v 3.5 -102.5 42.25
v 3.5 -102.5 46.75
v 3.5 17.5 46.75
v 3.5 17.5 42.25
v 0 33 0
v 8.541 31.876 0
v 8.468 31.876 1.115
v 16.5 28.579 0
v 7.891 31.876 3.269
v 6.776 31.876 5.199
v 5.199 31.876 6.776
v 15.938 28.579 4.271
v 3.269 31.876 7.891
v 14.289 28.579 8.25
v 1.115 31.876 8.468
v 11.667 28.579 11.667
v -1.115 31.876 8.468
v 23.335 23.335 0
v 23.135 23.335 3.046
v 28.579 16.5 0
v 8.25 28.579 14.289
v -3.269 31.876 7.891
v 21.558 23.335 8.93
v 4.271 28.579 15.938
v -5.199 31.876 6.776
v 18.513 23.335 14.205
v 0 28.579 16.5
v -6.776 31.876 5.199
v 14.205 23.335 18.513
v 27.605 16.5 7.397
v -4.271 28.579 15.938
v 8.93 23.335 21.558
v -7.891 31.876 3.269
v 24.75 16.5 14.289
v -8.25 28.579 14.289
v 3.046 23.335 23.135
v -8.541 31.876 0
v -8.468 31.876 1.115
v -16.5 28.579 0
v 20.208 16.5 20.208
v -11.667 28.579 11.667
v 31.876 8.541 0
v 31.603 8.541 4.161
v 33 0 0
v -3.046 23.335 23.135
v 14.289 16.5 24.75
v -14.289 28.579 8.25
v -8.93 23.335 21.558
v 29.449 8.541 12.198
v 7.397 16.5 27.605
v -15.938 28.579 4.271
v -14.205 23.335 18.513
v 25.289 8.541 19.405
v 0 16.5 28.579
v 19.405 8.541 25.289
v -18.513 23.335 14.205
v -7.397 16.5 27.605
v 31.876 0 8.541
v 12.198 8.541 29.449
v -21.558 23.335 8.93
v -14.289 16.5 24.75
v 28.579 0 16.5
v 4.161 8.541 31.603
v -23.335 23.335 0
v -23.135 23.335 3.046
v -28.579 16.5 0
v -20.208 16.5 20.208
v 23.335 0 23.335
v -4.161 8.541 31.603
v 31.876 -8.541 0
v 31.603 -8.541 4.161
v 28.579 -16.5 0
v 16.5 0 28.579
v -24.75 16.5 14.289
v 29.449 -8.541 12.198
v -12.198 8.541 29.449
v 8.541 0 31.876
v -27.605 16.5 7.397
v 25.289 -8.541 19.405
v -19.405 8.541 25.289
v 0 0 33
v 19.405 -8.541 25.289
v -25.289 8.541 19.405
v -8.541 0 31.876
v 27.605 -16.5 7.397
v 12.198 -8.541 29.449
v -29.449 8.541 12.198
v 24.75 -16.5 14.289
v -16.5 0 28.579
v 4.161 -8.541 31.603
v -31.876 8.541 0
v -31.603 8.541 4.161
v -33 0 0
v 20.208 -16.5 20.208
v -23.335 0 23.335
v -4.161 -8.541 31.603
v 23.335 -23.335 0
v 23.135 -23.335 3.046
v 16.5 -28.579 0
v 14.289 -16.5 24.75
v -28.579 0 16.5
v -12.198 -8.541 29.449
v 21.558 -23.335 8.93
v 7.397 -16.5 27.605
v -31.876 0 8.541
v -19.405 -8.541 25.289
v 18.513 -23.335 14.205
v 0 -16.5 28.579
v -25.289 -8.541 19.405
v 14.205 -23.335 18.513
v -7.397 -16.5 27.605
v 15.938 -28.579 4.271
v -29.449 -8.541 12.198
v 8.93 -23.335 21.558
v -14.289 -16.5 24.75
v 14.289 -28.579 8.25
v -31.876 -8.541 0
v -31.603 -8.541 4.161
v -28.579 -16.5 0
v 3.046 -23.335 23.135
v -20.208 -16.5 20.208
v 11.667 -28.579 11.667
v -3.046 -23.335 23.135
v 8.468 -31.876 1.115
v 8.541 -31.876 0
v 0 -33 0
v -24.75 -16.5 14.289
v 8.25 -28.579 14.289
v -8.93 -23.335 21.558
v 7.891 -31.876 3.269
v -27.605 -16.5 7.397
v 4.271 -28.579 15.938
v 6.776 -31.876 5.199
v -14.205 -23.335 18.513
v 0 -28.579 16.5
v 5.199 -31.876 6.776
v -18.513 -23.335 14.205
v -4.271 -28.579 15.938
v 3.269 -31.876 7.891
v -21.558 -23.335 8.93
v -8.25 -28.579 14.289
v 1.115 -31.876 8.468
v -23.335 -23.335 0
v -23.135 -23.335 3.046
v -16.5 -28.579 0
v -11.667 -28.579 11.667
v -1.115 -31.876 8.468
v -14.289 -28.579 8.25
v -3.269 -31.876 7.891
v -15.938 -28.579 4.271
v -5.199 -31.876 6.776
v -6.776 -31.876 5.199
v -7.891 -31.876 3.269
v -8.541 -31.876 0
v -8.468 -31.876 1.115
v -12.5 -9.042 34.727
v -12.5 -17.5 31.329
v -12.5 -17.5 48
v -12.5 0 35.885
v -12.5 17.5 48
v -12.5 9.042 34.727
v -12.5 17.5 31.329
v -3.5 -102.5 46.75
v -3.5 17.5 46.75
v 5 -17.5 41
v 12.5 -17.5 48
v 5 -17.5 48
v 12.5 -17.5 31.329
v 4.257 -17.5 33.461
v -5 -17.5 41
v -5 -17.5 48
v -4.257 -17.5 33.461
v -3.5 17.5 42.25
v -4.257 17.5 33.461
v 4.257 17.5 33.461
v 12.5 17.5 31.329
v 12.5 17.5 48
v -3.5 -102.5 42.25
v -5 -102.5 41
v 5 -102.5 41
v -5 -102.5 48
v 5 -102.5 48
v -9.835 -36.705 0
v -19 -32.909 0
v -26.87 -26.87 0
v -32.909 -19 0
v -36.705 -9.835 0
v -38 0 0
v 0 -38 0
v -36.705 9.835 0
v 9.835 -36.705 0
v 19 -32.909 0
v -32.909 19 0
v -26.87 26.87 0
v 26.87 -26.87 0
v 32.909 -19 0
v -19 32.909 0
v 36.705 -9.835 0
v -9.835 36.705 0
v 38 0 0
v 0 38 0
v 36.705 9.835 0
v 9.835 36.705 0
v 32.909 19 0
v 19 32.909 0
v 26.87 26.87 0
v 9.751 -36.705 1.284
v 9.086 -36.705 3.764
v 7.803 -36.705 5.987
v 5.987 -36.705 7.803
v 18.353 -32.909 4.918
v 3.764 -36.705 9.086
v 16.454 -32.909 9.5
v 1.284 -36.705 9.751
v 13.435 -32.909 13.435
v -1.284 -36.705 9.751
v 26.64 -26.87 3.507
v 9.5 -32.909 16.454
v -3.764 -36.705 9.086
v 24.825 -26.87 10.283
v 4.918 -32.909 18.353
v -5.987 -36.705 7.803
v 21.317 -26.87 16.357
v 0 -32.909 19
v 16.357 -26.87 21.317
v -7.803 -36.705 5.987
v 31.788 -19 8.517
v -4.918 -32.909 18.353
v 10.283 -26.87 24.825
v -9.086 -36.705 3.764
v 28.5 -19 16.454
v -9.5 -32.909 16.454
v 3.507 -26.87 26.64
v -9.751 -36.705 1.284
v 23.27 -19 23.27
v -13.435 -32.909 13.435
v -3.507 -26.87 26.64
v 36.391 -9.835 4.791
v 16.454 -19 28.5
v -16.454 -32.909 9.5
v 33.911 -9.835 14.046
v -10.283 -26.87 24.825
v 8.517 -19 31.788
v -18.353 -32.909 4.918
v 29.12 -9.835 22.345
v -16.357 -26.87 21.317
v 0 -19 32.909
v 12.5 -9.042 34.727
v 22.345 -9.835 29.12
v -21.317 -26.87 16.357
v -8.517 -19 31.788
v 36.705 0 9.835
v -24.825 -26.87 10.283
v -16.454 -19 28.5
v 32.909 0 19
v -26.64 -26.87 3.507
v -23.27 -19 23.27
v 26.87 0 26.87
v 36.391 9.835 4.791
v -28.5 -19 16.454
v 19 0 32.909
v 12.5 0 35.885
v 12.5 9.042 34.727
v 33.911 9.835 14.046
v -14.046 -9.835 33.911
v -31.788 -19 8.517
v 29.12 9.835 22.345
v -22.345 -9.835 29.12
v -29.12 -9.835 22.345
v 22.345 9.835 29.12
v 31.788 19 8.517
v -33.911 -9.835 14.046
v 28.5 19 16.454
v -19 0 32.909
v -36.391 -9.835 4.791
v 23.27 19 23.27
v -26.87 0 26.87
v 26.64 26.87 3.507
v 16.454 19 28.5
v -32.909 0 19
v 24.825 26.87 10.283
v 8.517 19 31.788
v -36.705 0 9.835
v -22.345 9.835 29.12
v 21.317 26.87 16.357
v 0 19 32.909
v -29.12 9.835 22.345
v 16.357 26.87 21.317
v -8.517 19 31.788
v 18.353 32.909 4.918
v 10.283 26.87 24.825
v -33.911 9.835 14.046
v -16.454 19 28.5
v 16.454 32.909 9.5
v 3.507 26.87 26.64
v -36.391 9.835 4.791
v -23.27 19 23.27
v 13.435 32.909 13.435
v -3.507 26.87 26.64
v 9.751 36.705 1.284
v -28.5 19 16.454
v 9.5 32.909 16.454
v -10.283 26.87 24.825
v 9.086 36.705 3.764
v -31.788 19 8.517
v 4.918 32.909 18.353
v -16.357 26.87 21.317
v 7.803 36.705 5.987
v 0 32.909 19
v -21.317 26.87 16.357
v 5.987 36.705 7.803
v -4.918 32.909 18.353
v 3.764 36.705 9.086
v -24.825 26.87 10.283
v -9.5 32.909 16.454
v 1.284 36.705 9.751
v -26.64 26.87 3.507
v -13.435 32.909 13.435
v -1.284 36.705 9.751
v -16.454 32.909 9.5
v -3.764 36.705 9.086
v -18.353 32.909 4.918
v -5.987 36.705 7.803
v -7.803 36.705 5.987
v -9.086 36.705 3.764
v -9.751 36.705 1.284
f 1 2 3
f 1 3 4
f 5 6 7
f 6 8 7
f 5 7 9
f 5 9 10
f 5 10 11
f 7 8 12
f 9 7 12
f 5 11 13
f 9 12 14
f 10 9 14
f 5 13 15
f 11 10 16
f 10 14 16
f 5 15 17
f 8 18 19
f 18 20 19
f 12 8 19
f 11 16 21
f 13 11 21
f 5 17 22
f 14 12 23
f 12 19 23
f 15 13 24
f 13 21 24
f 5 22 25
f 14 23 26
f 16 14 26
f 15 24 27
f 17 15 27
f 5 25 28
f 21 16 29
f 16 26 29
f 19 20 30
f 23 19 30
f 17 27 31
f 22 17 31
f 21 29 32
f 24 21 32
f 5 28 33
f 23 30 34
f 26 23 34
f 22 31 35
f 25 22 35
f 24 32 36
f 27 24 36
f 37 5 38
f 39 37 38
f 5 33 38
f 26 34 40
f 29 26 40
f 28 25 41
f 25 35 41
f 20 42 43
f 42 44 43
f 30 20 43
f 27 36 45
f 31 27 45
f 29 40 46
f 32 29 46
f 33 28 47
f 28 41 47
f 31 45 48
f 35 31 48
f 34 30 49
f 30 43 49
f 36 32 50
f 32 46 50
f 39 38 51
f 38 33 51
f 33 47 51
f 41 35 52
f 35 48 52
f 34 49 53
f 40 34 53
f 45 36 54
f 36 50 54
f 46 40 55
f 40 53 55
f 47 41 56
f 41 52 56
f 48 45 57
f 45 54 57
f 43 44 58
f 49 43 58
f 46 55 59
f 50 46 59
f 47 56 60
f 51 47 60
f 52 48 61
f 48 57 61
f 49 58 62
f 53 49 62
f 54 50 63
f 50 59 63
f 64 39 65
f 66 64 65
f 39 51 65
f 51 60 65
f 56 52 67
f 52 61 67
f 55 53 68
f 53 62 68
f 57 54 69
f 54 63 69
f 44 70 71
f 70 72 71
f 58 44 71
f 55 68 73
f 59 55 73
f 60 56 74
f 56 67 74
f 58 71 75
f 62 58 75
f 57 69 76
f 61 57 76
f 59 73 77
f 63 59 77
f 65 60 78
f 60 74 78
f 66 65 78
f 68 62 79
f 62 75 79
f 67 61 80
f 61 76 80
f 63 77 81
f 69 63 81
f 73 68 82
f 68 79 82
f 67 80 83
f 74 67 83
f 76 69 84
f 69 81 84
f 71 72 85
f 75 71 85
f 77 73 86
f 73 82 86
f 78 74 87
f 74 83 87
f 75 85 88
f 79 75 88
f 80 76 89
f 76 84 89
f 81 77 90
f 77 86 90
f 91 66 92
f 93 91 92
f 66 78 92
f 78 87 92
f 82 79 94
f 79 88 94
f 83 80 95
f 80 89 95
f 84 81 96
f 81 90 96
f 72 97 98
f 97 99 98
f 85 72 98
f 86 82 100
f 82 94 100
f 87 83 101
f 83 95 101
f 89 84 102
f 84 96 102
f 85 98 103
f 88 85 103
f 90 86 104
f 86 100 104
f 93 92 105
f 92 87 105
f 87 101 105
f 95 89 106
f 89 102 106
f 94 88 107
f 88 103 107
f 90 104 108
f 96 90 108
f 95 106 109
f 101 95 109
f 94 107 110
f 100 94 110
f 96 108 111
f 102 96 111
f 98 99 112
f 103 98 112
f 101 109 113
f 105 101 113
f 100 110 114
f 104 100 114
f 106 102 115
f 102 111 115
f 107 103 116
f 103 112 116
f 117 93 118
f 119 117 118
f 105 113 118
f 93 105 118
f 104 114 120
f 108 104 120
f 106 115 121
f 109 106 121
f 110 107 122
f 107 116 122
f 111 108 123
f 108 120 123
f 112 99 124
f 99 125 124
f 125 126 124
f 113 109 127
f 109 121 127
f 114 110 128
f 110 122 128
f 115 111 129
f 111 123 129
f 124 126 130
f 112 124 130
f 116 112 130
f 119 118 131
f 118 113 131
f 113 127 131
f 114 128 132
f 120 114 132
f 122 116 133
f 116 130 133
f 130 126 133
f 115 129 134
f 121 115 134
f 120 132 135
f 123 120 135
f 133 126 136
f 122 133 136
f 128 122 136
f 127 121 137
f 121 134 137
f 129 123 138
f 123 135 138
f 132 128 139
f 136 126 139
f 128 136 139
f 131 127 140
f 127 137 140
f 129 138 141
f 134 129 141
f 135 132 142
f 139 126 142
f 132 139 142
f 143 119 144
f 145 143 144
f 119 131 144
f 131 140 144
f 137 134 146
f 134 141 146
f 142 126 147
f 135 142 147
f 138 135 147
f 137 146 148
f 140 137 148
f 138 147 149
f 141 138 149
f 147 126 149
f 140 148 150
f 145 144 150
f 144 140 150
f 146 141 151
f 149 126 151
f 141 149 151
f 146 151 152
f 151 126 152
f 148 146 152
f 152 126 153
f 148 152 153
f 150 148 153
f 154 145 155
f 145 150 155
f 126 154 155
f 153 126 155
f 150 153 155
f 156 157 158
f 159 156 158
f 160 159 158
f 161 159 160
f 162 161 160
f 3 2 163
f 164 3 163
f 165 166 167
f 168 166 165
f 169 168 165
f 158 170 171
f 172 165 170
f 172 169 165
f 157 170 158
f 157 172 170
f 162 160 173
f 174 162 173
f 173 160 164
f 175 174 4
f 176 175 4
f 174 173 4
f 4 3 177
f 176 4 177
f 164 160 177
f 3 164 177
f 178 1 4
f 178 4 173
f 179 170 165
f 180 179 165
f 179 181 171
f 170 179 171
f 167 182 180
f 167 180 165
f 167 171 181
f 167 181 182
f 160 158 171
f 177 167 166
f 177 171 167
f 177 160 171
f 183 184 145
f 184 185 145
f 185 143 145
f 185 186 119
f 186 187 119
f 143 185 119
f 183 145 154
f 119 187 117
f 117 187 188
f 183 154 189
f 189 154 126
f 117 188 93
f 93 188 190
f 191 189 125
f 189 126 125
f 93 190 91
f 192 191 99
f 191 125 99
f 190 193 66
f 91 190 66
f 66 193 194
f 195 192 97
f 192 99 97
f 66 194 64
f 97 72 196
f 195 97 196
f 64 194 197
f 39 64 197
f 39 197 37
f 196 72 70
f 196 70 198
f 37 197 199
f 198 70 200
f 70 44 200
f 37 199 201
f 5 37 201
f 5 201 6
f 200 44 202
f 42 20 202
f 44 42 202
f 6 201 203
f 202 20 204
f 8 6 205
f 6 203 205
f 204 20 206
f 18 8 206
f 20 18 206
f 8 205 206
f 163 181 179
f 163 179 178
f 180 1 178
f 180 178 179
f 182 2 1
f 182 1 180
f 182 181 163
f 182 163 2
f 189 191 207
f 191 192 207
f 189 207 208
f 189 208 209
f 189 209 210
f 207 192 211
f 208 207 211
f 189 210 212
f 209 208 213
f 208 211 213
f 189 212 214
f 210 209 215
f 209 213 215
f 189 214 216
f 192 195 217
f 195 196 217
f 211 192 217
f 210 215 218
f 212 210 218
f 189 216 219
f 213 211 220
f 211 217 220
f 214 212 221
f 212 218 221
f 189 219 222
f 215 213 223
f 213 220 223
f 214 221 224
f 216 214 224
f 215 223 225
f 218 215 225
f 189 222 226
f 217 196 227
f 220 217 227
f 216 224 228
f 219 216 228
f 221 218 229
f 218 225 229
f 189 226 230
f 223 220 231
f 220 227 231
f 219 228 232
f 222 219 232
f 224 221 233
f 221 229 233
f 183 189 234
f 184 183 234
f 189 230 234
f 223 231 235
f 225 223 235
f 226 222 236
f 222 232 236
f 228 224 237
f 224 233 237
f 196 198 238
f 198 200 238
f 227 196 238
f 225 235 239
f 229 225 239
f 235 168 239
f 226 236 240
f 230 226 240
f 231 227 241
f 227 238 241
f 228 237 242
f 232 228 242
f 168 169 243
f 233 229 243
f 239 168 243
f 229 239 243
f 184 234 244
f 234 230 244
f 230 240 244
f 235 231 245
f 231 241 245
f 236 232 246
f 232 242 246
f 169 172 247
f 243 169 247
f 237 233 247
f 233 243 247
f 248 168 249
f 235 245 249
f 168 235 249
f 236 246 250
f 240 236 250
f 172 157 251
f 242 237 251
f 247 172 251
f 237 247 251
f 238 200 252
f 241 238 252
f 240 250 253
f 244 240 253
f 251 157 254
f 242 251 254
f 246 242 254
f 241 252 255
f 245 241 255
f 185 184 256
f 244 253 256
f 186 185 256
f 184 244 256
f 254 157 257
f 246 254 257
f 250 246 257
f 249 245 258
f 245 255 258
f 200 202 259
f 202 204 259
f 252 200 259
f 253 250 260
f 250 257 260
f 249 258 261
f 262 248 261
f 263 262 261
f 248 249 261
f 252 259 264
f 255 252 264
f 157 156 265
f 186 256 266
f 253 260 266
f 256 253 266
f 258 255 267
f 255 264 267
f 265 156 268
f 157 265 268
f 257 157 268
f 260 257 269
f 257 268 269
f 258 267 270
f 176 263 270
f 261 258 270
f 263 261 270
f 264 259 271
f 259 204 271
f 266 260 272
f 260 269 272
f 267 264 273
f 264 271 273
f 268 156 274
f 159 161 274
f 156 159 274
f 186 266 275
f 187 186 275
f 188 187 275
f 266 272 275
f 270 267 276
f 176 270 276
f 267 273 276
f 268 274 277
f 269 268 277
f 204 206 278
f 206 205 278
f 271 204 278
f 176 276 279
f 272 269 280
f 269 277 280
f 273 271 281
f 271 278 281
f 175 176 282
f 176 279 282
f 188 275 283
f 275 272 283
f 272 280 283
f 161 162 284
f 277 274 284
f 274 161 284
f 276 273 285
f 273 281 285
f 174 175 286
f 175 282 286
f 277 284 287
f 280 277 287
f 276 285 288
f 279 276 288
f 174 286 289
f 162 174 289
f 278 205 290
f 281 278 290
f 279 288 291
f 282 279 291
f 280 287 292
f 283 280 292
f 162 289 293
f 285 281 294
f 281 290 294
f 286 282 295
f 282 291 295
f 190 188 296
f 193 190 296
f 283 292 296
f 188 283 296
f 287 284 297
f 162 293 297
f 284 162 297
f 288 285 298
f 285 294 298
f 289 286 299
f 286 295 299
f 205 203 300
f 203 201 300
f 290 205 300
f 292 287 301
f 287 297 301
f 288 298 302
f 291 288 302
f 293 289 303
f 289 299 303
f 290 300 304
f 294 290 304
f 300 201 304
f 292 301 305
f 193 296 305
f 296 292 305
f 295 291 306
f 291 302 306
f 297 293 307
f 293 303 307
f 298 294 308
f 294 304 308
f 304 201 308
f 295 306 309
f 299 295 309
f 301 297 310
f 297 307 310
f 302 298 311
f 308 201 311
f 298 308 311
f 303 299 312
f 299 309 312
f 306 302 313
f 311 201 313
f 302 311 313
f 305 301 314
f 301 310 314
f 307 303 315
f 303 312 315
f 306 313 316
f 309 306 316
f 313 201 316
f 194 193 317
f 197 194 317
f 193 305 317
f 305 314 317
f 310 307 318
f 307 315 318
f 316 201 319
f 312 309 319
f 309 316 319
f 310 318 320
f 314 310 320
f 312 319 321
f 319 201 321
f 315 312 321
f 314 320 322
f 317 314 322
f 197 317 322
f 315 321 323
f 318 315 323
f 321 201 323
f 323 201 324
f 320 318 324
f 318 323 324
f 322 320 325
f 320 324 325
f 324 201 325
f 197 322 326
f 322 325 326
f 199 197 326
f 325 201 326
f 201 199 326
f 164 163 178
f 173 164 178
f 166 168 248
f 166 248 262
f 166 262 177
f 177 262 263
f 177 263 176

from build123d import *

# Parameters (mm, degrees)
REVOLVE1_ANGLE                  = 180
BOSS_EXTRUDE2_REACH             = 67.818
BOSS_EXTRUDE2_END_RADIUS        = 38
SKETCH2_W                       = 25
SKETCH2_H                       = 35
BOSS_EXTRUDE2_DIRECTION_2_DEPTH = 10
SKETCH5_W                       = 10
SKETCH5_H                       = 120
BOSS_EXTRUDE3_DEPTH             = 7
SKETCH6_W                       = 7
SKETCH6_H                       = 4.5
CUT_EXTRUDE1_DEPTH              = 265


with BuildPart() as part:
    # Sketch1 → Revolve1 (revolve)
    with BuildSketch(Plane.XY):
        with BuildLine():
            Line((0, 38), (0, 33))
            ThreePointArc((0, 33), (33, 0), (0, -33))
            Line((0, -33), (0, -38))
            ThreePointArc((0, -38), (38, 0), (0, 38))
        make_face()
    revolve(axis=Axis((0, -33, 0), (0, -1, 0)), revolution_arc=REVOLVE1_ANGLE)

    # Boss-Extrude2: up to this sphere (the profile starts outside it)
    boss_extrude2_end = Location((0, 0, 0)) * Sphere(BOSS_EXTRUDE2_END_RADIUS, mode=Mode.PRIVATE)
    # Sketch2 → Boss-Extrude2 (add, up to the surface)
    with BuildSketch(Plane(origin=(0, 0, 38), x_dir=(-1, 0, 0), z_dir=(0, 0, -1)), mode=Mode.PRIVATE) as boss_extrude2_sk1:
        Rectangle(SKETCH2_W, SKETCH2_H)
    boss_extrude2_tool1 = extrude(boss_extrude2_sk1.sketch, amount=BOSS_EXTRUDE2_REACH, mode=Mode.PRIVATE) - boss_extrude2_end
    add(boss_extrude2_tool1.solids().sort_by_distance((0, 0, 38))[0])

    # Sketch2 → Boss-Extrude2 direction 2 (add)
    with BuildSketch(Plane(origin=(0, 0, 38), x_dir=(-1, 0, 0), z_dir=(0, 0, -1))):
        Rectangle(SKETCH2_W, SKETCH2_H)
    extrude(amount=-BOSS_EXTRUDE2_DIRECTION_2_DEPTH)

    # Sketch5 → Boss-Extrude3 (add)
    with BuildSketch(Plane.XY.offset(48)):
        with Locations((0, -42.5)):
            Rectangle(SKETCH5_W, SKETCH5_H)
    extrude(amount=-BOSS_EXTRUDE3_DEPTH)

    # Sketch6 → Cut-Extrude1 (cut)
    with BuildSketch(Plane(origin=(0, -102.5, 0), x_dir=(-1, 0, 0), z_dir=(0, -1, 0))):
        with Locations((0, -44.5)):
            Rectangle(SKETCH6_W, SKETCH6_H)
    extrude(amount=-CUT_EXTRUDE1_DEPTH, mode=Mode.SUBTRACT)


solid = part.part
